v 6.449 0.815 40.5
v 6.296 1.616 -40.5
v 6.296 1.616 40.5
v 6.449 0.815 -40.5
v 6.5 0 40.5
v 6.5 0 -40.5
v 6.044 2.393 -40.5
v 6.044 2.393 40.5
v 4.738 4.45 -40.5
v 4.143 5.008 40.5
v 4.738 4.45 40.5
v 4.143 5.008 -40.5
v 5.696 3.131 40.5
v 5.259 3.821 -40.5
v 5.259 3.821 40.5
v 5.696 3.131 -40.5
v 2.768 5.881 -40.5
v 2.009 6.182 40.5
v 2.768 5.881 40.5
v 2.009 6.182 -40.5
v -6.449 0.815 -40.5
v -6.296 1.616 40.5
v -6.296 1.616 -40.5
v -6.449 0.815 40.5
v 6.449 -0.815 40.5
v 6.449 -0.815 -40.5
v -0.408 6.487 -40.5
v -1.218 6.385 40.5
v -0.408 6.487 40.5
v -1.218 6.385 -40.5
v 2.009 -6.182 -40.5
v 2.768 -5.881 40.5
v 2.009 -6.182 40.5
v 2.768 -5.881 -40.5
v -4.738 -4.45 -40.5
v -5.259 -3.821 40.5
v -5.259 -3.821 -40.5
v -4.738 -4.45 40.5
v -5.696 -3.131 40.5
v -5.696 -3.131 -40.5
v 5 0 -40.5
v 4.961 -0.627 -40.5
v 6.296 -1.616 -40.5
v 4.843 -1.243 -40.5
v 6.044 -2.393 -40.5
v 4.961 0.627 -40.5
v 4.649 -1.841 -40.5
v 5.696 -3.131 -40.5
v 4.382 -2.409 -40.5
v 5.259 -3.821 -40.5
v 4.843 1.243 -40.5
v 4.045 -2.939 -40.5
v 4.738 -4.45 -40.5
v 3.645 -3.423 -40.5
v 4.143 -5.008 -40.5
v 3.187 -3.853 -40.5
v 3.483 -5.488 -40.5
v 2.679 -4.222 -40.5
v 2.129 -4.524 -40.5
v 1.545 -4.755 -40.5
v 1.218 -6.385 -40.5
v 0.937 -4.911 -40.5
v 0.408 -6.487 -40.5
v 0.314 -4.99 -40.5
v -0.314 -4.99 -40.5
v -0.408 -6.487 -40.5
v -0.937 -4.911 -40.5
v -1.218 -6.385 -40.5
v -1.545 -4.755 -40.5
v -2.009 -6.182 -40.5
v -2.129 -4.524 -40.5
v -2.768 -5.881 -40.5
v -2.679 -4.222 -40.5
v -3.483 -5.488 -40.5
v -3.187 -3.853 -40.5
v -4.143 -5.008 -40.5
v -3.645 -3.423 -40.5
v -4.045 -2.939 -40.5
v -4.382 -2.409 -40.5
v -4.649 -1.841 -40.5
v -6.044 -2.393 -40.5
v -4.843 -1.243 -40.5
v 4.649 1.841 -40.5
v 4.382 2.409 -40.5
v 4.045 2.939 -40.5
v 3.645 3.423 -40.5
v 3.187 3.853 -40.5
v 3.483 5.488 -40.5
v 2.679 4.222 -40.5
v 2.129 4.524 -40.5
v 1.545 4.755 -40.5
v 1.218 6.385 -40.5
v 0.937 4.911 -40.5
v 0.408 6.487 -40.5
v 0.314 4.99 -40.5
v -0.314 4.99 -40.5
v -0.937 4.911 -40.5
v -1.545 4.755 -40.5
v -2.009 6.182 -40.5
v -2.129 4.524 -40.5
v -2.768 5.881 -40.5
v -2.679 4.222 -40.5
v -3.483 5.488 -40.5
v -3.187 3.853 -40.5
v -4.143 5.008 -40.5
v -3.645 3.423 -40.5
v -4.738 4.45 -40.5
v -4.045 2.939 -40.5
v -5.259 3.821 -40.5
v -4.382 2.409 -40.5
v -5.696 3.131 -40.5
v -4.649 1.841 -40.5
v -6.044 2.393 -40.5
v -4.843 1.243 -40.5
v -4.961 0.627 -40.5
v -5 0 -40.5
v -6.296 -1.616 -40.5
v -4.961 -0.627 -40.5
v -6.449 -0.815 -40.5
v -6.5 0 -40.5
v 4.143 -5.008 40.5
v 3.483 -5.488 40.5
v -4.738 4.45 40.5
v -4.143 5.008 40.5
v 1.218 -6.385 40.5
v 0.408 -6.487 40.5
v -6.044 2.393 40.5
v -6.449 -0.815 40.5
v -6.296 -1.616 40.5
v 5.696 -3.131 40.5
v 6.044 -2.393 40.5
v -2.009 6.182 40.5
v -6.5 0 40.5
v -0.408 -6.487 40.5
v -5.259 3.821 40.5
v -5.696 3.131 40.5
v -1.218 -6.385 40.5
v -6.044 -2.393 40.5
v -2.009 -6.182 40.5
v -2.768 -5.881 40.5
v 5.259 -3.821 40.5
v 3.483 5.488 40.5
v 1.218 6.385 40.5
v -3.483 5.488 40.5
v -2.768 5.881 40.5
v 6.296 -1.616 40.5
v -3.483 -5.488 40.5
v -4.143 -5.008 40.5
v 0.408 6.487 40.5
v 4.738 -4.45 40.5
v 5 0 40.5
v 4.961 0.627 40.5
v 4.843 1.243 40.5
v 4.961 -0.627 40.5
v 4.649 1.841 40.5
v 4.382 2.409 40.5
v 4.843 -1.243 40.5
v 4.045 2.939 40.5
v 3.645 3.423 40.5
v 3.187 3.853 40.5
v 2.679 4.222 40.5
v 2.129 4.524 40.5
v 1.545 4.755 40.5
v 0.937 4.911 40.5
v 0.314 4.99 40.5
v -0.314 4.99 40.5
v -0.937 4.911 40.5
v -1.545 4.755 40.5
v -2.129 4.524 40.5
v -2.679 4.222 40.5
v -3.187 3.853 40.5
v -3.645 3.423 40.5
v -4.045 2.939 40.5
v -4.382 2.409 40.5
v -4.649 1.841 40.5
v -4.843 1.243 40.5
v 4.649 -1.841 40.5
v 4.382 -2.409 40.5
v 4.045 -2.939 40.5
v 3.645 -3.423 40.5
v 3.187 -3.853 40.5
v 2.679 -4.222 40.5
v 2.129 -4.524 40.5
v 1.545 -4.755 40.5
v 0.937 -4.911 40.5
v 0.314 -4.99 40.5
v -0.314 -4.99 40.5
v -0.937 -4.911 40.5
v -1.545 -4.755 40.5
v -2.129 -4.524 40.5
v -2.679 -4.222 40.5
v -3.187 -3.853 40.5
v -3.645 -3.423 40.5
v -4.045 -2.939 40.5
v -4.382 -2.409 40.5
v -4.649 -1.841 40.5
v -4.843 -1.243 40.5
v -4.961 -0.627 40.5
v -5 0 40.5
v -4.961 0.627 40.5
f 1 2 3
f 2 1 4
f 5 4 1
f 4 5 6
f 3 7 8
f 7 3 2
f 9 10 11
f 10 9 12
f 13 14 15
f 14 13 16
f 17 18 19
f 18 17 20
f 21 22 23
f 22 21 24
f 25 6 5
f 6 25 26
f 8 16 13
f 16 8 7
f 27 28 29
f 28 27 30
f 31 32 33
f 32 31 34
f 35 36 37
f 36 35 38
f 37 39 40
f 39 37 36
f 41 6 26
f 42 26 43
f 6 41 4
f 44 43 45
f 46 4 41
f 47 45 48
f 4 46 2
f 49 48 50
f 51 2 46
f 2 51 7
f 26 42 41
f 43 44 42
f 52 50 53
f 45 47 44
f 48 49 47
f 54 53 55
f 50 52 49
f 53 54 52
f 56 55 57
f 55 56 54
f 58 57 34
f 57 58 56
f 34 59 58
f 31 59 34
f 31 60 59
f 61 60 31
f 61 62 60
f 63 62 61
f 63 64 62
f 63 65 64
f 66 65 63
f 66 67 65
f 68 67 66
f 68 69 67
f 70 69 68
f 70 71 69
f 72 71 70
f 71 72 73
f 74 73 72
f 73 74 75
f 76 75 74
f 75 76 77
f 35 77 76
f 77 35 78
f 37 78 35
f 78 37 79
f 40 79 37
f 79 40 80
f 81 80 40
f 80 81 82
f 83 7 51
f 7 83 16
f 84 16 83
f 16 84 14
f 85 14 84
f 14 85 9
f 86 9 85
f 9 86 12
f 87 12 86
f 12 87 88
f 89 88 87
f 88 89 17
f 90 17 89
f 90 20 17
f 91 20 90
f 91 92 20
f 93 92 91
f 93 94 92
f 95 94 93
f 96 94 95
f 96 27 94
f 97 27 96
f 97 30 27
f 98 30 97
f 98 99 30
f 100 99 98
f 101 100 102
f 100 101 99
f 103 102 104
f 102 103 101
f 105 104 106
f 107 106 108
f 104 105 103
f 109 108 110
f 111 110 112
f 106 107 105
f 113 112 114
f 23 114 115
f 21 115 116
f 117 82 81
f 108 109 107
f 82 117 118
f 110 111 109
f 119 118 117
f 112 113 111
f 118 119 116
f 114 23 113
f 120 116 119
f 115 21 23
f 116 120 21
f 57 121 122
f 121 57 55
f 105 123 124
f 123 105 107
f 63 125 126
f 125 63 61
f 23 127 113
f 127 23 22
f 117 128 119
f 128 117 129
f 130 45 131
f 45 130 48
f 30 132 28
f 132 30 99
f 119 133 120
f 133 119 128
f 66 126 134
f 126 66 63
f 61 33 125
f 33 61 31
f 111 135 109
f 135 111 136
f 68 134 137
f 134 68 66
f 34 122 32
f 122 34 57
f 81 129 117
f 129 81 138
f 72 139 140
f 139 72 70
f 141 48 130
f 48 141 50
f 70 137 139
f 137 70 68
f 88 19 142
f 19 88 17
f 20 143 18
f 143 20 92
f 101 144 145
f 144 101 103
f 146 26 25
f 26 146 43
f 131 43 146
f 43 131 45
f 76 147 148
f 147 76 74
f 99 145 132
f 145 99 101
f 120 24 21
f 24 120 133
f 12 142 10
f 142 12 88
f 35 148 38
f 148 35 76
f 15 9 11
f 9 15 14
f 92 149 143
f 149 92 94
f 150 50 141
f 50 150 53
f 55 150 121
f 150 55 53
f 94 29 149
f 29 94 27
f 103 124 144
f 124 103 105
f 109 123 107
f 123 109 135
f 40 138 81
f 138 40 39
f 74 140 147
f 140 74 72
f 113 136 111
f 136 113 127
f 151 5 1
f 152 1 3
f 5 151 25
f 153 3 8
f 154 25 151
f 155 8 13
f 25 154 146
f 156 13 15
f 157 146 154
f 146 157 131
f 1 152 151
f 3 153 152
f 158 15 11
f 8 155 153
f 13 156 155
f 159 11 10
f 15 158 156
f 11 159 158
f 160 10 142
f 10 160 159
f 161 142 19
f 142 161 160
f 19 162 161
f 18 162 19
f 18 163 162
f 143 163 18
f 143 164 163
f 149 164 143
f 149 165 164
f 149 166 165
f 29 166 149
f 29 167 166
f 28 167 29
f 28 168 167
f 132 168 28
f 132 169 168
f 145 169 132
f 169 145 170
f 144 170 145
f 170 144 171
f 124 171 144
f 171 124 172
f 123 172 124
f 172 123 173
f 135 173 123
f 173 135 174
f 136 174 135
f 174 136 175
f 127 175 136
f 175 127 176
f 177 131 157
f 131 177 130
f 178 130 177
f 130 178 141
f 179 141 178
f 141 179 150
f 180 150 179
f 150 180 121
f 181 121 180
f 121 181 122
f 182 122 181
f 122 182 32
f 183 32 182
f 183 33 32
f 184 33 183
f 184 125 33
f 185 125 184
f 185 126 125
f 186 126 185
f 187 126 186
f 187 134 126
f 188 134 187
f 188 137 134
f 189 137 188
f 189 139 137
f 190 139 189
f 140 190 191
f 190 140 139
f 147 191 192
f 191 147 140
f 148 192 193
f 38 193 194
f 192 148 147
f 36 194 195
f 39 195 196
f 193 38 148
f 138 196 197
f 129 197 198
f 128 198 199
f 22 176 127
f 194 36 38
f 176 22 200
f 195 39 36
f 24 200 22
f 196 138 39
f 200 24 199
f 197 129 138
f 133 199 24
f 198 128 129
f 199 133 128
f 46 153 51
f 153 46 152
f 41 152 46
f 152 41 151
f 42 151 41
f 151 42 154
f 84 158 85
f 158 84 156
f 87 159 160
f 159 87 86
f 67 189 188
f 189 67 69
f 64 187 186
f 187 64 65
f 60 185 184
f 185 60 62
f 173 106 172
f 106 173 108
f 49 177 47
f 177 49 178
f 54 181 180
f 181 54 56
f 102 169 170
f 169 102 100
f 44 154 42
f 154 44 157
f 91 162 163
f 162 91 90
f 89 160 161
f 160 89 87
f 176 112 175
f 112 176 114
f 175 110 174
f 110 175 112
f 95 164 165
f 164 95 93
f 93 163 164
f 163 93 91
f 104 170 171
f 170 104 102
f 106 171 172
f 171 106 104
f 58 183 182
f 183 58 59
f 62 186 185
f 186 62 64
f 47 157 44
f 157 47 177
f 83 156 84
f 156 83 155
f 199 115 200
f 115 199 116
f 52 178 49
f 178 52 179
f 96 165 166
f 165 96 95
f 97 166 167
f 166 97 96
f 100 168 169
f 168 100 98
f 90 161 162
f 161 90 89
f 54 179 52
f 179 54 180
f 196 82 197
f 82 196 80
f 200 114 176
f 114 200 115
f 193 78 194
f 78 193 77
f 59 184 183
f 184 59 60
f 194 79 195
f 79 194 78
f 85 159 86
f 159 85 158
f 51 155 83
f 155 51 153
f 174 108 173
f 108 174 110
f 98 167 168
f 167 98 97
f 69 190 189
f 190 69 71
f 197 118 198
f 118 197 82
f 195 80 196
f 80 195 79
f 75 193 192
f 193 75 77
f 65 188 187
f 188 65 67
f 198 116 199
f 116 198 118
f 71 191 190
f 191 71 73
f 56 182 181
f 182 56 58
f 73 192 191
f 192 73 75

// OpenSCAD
$fn = 50;


difference() {
	union() {
		translate(v = [0, 0, -40.5000000000]) {
			cylinder(h = 81, r = 6.5000000000);
		}
	}
	union() {
		translate(v = [0, 0, -100.0000000000]) {
			cylinder(h = 200, r = 5.0000000000);
		}
	}
}
